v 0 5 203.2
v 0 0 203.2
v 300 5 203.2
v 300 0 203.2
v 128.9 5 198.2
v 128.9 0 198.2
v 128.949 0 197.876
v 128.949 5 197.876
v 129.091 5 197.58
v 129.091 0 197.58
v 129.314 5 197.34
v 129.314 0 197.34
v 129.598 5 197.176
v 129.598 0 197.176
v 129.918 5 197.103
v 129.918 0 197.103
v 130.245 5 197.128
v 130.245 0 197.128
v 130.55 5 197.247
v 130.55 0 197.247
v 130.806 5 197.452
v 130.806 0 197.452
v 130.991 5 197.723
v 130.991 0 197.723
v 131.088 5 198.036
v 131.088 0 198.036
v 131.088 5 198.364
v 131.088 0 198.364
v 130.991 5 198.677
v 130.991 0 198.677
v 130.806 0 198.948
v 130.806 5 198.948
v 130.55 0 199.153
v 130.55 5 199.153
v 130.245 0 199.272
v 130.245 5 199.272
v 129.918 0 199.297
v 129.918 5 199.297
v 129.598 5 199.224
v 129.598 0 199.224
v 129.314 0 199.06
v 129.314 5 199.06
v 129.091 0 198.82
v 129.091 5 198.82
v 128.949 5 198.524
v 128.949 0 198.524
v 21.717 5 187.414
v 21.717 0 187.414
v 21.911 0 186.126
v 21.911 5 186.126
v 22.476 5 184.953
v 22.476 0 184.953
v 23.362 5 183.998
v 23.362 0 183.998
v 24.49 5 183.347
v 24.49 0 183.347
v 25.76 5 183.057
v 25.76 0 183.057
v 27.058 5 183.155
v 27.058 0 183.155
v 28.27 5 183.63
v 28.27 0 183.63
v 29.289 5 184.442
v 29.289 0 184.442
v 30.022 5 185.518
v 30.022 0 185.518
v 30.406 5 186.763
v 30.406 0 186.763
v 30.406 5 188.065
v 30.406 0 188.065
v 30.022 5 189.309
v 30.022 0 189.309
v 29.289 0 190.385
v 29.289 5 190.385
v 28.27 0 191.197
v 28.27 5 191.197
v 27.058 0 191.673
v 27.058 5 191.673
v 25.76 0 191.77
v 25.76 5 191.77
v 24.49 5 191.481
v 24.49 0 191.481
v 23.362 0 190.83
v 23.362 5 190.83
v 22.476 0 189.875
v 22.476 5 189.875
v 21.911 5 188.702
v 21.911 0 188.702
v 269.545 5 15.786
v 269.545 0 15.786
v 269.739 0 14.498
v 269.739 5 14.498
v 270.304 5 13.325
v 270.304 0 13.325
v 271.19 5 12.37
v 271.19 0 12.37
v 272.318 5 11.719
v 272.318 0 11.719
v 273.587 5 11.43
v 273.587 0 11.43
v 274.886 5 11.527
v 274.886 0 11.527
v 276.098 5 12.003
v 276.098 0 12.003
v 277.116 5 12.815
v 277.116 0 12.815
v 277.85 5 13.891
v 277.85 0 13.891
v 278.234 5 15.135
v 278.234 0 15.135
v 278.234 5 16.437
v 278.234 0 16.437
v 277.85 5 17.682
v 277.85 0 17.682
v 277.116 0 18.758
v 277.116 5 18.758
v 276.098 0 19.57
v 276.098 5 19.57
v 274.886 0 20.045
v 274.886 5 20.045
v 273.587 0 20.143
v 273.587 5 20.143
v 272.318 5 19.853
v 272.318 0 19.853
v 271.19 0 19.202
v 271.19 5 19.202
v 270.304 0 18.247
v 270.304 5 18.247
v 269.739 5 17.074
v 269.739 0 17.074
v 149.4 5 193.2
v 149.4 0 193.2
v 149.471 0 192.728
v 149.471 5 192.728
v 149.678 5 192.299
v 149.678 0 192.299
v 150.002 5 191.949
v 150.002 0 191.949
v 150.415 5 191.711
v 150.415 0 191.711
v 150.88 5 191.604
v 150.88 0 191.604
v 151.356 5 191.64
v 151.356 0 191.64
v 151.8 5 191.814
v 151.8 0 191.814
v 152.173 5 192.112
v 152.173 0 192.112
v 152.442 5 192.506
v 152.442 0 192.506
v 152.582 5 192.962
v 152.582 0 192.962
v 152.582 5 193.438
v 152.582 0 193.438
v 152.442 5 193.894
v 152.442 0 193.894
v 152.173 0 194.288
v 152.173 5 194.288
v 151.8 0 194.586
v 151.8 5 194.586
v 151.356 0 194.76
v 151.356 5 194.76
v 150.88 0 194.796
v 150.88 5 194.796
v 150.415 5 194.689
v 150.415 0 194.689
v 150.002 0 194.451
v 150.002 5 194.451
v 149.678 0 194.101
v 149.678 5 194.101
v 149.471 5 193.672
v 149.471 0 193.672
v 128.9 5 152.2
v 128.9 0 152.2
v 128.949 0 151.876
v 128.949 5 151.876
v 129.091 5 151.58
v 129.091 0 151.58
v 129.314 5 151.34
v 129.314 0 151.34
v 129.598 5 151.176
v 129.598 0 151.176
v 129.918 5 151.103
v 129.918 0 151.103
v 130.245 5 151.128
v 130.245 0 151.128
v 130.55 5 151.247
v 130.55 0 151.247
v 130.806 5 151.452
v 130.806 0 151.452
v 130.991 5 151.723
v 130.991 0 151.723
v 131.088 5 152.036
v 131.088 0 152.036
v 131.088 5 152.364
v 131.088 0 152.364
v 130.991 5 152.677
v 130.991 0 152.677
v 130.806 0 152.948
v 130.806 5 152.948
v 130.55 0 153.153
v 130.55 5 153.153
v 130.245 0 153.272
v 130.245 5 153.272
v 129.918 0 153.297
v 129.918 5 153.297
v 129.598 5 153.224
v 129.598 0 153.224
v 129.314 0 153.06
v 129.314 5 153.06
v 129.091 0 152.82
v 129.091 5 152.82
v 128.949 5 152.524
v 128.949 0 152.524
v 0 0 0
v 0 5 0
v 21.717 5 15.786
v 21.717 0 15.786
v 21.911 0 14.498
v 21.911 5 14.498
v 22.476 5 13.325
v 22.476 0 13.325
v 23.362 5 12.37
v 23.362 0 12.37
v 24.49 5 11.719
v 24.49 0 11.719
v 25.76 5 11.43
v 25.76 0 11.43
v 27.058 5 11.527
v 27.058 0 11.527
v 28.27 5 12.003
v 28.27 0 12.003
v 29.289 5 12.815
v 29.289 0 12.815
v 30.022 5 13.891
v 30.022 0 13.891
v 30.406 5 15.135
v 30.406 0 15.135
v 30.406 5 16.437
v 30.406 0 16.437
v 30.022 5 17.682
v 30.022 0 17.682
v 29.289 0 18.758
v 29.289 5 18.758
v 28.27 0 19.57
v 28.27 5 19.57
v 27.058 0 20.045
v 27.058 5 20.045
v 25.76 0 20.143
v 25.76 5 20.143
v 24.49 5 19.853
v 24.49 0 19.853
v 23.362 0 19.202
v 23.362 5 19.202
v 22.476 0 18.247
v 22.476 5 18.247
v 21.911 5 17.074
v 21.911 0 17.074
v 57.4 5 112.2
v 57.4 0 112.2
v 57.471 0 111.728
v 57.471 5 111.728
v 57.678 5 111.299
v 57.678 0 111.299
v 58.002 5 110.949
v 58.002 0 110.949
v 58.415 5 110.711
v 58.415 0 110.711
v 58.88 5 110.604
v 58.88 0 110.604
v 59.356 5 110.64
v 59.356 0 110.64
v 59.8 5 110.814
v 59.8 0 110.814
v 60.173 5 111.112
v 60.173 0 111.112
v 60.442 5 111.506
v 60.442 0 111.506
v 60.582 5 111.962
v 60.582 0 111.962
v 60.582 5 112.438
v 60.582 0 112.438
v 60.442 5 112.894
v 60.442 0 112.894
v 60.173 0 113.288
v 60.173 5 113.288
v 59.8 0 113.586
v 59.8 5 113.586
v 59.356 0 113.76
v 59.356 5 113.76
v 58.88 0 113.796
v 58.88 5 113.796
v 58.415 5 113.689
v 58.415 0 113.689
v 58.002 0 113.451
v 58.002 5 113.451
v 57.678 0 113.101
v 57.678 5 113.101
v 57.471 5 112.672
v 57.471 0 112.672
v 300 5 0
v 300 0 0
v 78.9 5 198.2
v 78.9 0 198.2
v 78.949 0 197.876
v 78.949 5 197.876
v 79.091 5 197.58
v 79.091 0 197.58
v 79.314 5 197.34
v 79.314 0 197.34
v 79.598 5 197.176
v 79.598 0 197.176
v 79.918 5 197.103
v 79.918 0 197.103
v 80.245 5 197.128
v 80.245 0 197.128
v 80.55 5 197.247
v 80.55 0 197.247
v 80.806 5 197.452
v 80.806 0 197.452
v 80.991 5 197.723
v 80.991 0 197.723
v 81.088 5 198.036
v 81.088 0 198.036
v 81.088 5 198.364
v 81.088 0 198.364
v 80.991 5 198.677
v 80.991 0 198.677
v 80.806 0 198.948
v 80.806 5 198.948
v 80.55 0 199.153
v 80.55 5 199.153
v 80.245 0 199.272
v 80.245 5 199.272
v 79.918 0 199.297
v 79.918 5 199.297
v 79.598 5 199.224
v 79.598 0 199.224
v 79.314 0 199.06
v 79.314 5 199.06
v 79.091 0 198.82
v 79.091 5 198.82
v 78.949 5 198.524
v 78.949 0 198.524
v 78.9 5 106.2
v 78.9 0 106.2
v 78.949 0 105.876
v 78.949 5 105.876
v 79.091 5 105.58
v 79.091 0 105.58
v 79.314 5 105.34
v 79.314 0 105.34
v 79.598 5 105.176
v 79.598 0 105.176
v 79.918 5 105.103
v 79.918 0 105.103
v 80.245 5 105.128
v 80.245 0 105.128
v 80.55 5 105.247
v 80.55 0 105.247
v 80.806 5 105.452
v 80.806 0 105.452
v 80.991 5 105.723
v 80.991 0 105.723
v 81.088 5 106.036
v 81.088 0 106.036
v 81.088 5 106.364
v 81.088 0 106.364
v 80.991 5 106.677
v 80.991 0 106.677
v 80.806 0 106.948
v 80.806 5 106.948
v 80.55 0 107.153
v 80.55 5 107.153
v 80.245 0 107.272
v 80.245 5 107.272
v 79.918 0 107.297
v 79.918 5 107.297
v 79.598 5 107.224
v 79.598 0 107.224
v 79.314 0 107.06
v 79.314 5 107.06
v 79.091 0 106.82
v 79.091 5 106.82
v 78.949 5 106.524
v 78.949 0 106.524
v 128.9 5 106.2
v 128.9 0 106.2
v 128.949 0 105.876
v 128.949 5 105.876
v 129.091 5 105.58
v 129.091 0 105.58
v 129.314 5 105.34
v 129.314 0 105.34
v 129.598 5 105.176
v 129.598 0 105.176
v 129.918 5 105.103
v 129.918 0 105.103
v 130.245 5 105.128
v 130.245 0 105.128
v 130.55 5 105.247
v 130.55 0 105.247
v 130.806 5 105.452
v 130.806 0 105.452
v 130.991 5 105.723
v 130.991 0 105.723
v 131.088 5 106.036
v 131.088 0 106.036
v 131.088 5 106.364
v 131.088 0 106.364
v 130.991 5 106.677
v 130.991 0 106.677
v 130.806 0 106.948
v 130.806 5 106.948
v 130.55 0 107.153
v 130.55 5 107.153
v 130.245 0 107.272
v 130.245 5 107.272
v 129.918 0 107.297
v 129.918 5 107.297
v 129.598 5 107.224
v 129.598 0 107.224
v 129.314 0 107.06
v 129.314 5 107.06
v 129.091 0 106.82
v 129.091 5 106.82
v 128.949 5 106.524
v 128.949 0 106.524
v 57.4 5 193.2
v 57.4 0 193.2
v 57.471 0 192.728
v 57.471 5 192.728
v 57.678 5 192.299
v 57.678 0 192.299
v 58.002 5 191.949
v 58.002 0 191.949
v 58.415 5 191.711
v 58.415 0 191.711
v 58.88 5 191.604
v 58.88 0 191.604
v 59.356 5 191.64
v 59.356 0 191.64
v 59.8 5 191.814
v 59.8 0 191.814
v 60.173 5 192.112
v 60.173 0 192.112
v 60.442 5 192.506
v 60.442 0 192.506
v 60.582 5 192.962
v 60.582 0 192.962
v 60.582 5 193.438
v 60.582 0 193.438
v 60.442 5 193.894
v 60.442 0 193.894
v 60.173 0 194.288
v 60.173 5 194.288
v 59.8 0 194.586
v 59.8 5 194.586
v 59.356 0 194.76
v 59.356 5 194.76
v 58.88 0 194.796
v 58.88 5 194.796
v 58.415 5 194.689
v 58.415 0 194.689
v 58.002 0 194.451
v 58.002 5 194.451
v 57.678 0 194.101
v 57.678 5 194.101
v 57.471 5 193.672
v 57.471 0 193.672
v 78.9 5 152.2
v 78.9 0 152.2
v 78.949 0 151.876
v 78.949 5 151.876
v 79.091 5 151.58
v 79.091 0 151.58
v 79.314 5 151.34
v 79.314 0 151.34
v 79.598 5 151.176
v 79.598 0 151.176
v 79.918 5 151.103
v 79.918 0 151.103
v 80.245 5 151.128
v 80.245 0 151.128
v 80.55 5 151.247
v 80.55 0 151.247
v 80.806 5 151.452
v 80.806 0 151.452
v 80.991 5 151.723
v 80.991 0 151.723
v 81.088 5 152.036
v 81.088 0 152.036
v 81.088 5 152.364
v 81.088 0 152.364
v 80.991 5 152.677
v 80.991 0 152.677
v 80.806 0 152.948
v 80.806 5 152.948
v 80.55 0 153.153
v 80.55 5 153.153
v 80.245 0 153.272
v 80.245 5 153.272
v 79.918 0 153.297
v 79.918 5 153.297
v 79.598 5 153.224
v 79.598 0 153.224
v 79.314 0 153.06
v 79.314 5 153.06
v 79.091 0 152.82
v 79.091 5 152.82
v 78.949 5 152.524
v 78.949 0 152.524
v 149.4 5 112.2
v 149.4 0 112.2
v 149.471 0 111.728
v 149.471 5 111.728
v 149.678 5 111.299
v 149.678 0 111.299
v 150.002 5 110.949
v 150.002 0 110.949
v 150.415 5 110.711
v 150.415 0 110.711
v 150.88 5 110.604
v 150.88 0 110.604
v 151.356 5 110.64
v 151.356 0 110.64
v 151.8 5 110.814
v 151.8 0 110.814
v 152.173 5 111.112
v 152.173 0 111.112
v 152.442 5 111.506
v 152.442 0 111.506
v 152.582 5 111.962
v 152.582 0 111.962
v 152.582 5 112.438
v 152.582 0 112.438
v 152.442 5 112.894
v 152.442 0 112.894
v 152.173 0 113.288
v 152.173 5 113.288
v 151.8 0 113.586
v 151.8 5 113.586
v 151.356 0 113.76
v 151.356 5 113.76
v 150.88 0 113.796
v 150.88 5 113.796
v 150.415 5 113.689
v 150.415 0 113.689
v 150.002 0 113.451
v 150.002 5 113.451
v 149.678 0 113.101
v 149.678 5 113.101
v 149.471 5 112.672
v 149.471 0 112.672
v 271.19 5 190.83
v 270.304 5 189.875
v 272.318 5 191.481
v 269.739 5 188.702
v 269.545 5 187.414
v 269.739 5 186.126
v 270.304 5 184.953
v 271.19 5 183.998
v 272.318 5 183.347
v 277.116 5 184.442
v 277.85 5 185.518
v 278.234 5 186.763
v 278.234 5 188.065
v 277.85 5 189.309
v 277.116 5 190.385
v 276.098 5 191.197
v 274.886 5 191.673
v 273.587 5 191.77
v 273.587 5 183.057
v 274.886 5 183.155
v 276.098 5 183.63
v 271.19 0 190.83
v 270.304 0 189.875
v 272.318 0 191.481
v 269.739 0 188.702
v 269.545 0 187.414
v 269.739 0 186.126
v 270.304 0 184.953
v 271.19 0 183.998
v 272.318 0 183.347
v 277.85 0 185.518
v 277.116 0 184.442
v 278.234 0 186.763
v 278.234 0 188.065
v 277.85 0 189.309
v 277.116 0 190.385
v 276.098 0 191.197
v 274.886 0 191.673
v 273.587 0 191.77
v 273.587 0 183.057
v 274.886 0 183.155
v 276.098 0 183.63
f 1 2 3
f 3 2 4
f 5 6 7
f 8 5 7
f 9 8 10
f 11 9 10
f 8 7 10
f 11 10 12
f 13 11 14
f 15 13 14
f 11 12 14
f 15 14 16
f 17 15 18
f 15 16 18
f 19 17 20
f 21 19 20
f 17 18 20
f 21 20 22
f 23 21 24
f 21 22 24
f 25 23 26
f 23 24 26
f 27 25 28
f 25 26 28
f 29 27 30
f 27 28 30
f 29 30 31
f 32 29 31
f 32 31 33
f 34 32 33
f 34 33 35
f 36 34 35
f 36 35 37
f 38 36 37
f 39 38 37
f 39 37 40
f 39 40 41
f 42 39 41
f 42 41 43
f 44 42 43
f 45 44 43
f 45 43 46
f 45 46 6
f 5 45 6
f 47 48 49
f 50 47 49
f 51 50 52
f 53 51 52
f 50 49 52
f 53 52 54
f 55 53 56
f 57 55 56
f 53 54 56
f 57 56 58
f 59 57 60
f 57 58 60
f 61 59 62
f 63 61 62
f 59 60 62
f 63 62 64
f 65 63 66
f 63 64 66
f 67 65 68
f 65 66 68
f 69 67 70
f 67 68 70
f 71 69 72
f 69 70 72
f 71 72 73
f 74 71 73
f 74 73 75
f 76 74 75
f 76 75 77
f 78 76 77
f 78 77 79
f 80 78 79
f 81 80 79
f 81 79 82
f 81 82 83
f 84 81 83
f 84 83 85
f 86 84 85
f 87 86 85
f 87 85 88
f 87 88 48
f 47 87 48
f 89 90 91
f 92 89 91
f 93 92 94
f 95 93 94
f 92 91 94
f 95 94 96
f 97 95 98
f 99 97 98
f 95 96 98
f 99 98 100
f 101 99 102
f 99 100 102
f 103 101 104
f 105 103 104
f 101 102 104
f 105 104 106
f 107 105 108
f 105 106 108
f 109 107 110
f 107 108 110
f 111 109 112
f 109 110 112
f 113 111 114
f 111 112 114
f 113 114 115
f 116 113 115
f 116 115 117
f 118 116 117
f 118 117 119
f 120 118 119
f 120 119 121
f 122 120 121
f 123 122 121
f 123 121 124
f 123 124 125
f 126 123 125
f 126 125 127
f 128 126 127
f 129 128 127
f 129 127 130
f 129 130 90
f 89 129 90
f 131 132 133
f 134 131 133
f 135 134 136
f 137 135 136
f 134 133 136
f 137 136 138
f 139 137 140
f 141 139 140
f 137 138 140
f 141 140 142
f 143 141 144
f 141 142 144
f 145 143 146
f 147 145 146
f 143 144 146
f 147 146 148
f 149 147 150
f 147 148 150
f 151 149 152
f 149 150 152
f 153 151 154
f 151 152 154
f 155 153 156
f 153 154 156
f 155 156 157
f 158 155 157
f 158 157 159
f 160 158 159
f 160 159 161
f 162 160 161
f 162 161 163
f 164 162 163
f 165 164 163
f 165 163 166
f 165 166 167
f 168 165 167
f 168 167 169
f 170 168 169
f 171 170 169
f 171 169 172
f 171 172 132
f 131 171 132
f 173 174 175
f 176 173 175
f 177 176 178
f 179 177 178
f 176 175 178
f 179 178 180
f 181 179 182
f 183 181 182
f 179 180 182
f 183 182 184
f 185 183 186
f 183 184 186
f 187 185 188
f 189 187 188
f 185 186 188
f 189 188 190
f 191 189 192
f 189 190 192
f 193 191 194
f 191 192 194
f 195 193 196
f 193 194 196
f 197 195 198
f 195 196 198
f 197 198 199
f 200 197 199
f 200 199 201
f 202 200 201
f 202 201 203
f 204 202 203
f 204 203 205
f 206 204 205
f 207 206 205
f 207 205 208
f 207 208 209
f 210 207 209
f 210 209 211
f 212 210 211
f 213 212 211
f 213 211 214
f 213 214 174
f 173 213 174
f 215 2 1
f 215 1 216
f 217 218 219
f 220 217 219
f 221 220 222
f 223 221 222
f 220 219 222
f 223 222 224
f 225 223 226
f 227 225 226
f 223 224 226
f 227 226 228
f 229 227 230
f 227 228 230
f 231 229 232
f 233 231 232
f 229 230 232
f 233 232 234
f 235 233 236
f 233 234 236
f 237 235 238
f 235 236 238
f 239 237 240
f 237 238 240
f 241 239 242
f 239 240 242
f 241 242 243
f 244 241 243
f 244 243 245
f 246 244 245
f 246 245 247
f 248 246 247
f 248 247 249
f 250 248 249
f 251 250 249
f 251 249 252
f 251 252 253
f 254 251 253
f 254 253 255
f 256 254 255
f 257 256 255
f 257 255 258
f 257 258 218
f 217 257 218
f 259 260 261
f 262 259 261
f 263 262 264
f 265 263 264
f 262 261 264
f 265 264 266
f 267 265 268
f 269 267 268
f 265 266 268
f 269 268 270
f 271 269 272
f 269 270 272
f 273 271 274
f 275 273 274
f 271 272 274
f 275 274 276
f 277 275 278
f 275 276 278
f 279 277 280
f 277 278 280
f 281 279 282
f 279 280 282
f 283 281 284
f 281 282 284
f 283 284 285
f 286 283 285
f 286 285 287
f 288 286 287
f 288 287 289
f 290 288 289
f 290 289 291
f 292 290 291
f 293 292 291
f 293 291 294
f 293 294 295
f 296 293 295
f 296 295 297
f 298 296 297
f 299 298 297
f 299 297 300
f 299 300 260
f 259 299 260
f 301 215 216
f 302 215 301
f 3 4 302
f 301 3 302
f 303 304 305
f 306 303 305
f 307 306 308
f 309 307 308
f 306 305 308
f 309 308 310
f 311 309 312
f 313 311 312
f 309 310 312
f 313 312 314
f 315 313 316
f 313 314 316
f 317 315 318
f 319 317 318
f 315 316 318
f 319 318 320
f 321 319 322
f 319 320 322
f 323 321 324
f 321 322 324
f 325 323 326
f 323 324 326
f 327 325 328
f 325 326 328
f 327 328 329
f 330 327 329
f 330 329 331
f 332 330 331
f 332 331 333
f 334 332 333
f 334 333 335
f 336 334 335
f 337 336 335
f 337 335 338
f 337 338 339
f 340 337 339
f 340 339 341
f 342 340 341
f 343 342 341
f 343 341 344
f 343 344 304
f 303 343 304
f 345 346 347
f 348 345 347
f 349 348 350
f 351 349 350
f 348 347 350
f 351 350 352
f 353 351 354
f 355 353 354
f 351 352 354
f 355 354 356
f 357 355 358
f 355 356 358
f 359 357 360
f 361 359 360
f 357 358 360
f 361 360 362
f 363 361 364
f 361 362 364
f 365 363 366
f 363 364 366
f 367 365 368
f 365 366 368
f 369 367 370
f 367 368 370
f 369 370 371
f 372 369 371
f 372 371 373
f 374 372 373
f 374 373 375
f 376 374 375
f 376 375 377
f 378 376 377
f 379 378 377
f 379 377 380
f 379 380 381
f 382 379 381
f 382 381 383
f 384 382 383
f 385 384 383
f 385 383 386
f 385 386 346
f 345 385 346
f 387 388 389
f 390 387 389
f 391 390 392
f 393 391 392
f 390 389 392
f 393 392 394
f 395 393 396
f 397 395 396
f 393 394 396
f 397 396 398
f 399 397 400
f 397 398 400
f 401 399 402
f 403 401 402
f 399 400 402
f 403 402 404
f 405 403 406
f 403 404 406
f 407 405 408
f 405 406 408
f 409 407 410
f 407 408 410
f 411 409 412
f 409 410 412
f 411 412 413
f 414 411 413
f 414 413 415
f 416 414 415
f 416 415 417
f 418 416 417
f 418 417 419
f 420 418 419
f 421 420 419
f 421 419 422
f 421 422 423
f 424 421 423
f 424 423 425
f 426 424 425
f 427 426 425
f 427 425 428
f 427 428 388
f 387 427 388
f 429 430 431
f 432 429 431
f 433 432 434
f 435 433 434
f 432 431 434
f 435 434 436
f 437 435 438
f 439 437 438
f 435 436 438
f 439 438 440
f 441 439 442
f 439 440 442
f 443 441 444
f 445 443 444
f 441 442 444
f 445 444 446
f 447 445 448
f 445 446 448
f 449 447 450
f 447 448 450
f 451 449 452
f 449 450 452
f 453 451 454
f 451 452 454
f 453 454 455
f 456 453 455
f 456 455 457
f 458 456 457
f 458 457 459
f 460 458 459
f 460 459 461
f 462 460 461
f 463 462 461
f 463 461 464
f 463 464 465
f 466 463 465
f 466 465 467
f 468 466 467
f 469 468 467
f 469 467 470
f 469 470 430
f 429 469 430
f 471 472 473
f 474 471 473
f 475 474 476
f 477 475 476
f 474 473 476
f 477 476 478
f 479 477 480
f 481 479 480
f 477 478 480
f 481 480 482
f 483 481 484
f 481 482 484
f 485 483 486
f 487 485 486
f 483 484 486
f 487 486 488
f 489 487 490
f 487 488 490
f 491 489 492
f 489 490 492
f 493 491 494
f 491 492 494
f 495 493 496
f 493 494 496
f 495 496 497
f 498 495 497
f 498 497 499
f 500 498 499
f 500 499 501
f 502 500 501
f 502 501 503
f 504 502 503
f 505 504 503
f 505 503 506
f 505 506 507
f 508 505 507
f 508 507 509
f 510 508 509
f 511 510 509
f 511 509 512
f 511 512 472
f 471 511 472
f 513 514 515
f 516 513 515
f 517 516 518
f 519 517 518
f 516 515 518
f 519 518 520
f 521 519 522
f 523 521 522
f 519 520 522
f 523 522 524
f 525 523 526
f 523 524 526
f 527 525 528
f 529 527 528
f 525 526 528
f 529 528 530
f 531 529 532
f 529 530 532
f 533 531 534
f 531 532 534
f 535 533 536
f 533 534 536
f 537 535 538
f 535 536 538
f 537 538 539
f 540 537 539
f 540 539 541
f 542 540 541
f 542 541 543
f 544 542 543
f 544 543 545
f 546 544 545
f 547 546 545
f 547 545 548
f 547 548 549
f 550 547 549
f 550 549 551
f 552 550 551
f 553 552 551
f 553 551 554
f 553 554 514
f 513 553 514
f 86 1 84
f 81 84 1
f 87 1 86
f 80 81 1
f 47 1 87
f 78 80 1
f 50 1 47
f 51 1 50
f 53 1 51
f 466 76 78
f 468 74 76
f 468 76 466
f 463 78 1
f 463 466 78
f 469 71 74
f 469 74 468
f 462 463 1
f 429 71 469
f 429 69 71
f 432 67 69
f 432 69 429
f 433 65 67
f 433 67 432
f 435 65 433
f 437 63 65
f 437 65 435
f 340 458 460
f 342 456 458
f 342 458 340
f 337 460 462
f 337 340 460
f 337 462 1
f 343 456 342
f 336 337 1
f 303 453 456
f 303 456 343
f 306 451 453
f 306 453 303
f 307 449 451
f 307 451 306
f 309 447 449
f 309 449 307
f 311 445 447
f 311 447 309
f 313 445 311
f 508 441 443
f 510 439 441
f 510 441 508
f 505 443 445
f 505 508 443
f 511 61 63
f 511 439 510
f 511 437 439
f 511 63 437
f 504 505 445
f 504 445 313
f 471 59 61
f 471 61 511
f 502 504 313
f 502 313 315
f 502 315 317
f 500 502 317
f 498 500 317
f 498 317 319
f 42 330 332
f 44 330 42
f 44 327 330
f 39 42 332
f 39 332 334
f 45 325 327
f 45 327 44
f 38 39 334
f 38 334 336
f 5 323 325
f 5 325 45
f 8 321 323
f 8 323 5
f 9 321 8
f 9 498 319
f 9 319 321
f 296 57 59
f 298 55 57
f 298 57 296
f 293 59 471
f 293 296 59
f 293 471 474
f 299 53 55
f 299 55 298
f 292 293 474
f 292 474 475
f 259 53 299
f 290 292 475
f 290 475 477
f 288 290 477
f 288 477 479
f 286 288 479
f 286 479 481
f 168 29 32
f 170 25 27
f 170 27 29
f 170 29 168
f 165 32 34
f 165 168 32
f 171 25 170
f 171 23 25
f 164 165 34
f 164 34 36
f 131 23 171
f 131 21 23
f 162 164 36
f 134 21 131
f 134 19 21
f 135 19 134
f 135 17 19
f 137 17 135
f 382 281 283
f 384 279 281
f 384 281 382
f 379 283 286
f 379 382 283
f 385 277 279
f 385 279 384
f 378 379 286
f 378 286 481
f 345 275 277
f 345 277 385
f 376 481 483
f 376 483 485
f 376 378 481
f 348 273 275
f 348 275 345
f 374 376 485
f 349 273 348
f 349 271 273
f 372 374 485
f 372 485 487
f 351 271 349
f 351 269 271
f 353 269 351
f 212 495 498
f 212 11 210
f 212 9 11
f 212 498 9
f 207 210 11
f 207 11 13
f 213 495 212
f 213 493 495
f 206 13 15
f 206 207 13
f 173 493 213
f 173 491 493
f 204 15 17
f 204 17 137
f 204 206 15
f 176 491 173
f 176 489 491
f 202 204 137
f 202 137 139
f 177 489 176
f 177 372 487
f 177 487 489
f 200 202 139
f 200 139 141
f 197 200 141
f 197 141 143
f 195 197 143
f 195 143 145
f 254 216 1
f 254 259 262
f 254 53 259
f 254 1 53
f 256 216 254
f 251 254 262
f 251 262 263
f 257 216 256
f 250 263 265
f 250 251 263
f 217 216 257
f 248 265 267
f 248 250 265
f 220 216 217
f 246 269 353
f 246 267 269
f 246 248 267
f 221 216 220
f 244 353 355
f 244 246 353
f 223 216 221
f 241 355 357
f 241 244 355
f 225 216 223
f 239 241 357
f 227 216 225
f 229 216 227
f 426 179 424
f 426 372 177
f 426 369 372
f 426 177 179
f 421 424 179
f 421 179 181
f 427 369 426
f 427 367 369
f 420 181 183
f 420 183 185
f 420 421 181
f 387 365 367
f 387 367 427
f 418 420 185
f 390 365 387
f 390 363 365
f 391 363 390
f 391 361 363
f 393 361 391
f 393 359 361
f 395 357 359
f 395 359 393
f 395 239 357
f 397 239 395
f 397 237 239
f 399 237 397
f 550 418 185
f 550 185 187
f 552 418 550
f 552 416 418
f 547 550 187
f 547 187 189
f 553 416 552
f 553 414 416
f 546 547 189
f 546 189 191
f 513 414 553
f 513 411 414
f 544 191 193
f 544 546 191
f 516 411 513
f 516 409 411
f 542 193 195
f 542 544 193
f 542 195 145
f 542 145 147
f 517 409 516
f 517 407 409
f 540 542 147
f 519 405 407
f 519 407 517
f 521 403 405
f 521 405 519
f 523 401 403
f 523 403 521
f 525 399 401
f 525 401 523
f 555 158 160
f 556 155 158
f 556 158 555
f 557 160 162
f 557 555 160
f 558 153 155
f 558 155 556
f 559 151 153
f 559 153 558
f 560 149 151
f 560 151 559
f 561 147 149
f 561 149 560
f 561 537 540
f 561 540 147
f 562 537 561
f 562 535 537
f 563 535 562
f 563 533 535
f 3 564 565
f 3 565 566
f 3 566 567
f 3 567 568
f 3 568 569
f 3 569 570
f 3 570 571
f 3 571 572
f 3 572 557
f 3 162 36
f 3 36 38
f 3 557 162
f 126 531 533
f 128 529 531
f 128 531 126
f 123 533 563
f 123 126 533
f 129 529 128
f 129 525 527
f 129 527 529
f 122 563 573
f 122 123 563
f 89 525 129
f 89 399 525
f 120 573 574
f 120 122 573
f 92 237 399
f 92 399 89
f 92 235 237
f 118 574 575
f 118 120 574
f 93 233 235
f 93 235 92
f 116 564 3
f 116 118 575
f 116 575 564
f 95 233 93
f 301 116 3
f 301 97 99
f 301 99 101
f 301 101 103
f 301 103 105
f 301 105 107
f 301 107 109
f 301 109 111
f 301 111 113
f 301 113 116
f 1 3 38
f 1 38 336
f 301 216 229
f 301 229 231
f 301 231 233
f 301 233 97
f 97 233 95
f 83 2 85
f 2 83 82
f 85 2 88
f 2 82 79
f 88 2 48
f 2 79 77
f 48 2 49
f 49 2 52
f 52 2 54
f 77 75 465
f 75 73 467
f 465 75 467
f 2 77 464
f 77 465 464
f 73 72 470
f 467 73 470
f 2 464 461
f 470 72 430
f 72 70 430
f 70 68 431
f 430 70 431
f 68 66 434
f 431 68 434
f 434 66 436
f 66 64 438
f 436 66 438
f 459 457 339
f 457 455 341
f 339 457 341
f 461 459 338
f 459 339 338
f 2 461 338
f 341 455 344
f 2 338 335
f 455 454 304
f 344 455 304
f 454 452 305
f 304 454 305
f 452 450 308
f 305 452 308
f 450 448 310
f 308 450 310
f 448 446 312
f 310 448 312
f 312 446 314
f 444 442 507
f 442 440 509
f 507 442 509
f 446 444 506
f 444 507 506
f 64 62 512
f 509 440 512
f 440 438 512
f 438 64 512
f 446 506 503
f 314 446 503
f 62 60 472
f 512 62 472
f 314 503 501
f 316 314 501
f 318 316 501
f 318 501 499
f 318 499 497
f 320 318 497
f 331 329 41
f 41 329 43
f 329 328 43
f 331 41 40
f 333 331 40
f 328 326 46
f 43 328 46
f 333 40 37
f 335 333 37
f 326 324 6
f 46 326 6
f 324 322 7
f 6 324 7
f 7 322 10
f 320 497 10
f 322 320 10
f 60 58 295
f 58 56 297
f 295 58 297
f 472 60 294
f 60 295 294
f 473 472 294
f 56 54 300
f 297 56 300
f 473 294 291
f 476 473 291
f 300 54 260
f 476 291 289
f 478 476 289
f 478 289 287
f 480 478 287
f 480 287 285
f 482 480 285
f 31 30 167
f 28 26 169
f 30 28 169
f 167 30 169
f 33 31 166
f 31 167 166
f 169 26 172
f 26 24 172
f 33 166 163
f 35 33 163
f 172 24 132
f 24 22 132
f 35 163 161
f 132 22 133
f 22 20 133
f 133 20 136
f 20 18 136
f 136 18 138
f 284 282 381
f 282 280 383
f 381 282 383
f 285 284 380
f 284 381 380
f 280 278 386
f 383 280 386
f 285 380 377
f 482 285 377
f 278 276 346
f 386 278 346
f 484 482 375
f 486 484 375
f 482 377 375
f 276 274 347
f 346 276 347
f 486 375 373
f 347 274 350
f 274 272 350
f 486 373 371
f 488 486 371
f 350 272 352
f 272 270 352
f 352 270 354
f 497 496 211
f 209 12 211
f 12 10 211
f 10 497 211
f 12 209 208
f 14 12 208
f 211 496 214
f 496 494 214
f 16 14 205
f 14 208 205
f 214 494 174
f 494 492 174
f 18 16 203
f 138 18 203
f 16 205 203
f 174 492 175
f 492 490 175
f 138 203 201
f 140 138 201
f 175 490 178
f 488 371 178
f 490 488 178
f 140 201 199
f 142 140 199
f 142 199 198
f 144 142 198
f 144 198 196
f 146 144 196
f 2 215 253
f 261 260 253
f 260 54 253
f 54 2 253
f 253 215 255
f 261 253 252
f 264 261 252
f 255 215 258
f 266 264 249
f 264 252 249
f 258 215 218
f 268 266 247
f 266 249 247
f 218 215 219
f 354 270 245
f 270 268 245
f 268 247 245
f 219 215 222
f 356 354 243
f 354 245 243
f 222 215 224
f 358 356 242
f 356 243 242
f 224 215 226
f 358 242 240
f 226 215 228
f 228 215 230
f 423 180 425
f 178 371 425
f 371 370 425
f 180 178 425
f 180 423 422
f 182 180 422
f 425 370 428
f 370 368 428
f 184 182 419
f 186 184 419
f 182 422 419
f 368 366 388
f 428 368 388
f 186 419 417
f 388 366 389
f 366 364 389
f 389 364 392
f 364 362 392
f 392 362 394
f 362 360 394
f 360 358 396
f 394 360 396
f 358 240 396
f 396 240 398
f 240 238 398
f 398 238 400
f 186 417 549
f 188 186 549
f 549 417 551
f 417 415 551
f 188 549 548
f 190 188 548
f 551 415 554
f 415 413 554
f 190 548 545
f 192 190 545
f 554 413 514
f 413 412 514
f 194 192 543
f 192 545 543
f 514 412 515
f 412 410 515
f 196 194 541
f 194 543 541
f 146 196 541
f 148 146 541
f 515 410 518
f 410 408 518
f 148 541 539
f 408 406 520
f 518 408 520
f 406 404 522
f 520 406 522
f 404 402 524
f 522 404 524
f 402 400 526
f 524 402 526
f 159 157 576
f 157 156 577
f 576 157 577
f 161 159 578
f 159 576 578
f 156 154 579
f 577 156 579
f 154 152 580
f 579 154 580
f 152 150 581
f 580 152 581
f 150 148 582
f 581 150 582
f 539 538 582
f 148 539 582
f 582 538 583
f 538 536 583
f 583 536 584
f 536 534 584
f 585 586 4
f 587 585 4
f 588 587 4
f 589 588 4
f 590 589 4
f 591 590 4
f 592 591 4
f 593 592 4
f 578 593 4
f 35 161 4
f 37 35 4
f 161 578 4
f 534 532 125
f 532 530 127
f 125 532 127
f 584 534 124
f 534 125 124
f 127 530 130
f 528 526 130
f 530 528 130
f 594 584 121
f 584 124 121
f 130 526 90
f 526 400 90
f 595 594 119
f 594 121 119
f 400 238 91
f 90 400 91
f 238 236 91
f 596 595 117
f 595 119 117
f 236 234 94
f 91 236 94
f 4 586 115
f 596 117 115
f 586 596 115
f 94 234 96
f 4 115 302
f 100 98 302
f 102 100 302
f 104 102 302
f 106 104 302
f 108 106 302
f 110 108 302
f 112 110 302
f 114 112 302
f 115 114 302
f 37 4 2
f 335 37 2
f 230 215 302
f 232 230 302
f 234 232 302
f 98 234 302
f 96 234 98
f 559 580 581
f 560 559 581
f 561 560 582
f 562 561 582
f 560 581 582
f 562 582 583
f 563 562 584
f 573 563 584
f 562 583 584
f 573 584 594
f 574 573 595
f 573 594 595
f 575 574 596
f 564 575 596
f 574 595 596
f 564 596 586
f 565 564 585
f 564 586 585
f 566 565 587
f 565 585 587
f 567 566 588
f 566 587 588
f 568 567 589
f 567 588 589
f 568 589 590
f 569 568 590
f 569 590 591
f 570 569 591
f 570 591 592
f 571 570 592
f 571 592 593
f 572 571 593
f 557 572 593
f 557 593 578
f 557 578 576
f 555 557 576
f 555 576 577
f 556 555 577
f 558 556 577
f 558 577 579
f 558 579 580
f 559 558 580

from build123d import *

# Parameters (mm, degrees)
SKETCH1_W                           = 300
SKETCH1_H                           = 203.2
BOSS_EXTRUDE1_DEPTH                 = 5
SKETCH2_R                           = 3.2639
HOLES_FOR_MOUNTING_TO_CHAMBER_DEPTH = 363.374447223
CLEARANCE_HOLES_FOR_LED_PANEL_D     = 2.2
M3_CLEARANCE_HOLE1_D                = 3.2
HOLE_FOR_1_4_300_SC_NUTS_SP_1_D     = 8.7376
HOLE_FOR_1_4_300_SC_NUTS_SP_1_DEPTH = 31.75
HOLE_FOR_1_4_300_SC_NUTS_SP_1_TIP   = 2.625039872


with BuildPart() as part:
    # Sketch1 → Boss-Extrude1 (new body)
    with BuildSketch(Plane(origin=(0, 0, 0), x_dir=(1, 0, 0), z_dir=(0, 1, 0))):
        with Locations((150, -101.6)):
            Rectangle(SKETCH1_W, SKETCH1_H)
    extrude(amount=BOSS_EXTRUDE1_DEPTH)

    # Sketch2 → holes for mounting to chamber (cut, through all)
    with BuildSketch(Plane(origin=(0, 5, 0), x_dir=(1, 0, 0), z_dir=(0, 1, 0))):
        with Locations(Location((26.0861, -15.7861, 0), (0, 0, 270))):
            Circle(SKETCH2_R)
        with Locations(Location((273.9139, -15.7861, 0), (0, 0, 90))):
            Circle(SKETCH2_R)
        with Locations(Location((273.9139, -187.4139, 0), (0, 0, 270))):
            Circle(SKETCH2_R)
        with Locations(Location((26.0861, -187.4139, 0), (0, 0, 90))):
            Circle(SKETCH2_R)
    extrude(amount=-HOLES_FOR_MOUNTING_TO_CHAMBER_DEPTH, mode=Mode.SUBTRACT)

    # clearance holes for led panel (through all)
    with Locations(Plane(origin=(0, 5, 0), x_dir=(1, 0, 0), z_dir=(0, 1, 0))):
        with Locations((80, -106.2), (130, -106.2), (130, -152.2), (80, -152.2), (80, -198.2), (130, -198.2)):
            Hole(CLEARANCE_HOLES_FOR_LED_PANEL_D / 2)

    # M3 Clearance Hole1 (through all)
    with Locations(Plane(origin=(0, 5, 0), x_dir=(1, 0, 0), z_dir=(0, 1, 0))):
        with Locations((59, -112.2), (151, -112.2), (151, -193.2), (59, -193.2)):
            Hole(M3_CLEARANCE_HOLE1_D / 2)

    # Hole for 1/4 300® SC Nuts (SP)1
    with Locations(Plane(origin=(0, 5, 0), x_dir=(1, 0, 0), z_dir=(0, 1, 0))):
        with Locations((26.0861, -15.7861), (273.9139, -15.7861), (273.9139, -187.4139), (26.0861, -187.4139)):
            Hole(HOLE_FOR_1_4_300_SC_NUTS_SP_1_D / 2, depth=HOLE_FOR_1_4_300_SC_NUTS_SP_1_DEPTH)
            with Locations((0, 0, -(HOLE_FOR_1_4_300_SC_NUTS_SP_1_DEPTH + HOLE_FOR_1_4_300_SC_NUTS_SP_1_TIP / 2))):  # 118° drill point
                Cone(0, HOLE_FOR_1_4_300_SC_NUTS_SP_1_D / 2, HOLE_FOR_1_4_300_SC_NUTS_SP_1_TIP, mode=Mode.SUBTRACT)


solid = part.part
